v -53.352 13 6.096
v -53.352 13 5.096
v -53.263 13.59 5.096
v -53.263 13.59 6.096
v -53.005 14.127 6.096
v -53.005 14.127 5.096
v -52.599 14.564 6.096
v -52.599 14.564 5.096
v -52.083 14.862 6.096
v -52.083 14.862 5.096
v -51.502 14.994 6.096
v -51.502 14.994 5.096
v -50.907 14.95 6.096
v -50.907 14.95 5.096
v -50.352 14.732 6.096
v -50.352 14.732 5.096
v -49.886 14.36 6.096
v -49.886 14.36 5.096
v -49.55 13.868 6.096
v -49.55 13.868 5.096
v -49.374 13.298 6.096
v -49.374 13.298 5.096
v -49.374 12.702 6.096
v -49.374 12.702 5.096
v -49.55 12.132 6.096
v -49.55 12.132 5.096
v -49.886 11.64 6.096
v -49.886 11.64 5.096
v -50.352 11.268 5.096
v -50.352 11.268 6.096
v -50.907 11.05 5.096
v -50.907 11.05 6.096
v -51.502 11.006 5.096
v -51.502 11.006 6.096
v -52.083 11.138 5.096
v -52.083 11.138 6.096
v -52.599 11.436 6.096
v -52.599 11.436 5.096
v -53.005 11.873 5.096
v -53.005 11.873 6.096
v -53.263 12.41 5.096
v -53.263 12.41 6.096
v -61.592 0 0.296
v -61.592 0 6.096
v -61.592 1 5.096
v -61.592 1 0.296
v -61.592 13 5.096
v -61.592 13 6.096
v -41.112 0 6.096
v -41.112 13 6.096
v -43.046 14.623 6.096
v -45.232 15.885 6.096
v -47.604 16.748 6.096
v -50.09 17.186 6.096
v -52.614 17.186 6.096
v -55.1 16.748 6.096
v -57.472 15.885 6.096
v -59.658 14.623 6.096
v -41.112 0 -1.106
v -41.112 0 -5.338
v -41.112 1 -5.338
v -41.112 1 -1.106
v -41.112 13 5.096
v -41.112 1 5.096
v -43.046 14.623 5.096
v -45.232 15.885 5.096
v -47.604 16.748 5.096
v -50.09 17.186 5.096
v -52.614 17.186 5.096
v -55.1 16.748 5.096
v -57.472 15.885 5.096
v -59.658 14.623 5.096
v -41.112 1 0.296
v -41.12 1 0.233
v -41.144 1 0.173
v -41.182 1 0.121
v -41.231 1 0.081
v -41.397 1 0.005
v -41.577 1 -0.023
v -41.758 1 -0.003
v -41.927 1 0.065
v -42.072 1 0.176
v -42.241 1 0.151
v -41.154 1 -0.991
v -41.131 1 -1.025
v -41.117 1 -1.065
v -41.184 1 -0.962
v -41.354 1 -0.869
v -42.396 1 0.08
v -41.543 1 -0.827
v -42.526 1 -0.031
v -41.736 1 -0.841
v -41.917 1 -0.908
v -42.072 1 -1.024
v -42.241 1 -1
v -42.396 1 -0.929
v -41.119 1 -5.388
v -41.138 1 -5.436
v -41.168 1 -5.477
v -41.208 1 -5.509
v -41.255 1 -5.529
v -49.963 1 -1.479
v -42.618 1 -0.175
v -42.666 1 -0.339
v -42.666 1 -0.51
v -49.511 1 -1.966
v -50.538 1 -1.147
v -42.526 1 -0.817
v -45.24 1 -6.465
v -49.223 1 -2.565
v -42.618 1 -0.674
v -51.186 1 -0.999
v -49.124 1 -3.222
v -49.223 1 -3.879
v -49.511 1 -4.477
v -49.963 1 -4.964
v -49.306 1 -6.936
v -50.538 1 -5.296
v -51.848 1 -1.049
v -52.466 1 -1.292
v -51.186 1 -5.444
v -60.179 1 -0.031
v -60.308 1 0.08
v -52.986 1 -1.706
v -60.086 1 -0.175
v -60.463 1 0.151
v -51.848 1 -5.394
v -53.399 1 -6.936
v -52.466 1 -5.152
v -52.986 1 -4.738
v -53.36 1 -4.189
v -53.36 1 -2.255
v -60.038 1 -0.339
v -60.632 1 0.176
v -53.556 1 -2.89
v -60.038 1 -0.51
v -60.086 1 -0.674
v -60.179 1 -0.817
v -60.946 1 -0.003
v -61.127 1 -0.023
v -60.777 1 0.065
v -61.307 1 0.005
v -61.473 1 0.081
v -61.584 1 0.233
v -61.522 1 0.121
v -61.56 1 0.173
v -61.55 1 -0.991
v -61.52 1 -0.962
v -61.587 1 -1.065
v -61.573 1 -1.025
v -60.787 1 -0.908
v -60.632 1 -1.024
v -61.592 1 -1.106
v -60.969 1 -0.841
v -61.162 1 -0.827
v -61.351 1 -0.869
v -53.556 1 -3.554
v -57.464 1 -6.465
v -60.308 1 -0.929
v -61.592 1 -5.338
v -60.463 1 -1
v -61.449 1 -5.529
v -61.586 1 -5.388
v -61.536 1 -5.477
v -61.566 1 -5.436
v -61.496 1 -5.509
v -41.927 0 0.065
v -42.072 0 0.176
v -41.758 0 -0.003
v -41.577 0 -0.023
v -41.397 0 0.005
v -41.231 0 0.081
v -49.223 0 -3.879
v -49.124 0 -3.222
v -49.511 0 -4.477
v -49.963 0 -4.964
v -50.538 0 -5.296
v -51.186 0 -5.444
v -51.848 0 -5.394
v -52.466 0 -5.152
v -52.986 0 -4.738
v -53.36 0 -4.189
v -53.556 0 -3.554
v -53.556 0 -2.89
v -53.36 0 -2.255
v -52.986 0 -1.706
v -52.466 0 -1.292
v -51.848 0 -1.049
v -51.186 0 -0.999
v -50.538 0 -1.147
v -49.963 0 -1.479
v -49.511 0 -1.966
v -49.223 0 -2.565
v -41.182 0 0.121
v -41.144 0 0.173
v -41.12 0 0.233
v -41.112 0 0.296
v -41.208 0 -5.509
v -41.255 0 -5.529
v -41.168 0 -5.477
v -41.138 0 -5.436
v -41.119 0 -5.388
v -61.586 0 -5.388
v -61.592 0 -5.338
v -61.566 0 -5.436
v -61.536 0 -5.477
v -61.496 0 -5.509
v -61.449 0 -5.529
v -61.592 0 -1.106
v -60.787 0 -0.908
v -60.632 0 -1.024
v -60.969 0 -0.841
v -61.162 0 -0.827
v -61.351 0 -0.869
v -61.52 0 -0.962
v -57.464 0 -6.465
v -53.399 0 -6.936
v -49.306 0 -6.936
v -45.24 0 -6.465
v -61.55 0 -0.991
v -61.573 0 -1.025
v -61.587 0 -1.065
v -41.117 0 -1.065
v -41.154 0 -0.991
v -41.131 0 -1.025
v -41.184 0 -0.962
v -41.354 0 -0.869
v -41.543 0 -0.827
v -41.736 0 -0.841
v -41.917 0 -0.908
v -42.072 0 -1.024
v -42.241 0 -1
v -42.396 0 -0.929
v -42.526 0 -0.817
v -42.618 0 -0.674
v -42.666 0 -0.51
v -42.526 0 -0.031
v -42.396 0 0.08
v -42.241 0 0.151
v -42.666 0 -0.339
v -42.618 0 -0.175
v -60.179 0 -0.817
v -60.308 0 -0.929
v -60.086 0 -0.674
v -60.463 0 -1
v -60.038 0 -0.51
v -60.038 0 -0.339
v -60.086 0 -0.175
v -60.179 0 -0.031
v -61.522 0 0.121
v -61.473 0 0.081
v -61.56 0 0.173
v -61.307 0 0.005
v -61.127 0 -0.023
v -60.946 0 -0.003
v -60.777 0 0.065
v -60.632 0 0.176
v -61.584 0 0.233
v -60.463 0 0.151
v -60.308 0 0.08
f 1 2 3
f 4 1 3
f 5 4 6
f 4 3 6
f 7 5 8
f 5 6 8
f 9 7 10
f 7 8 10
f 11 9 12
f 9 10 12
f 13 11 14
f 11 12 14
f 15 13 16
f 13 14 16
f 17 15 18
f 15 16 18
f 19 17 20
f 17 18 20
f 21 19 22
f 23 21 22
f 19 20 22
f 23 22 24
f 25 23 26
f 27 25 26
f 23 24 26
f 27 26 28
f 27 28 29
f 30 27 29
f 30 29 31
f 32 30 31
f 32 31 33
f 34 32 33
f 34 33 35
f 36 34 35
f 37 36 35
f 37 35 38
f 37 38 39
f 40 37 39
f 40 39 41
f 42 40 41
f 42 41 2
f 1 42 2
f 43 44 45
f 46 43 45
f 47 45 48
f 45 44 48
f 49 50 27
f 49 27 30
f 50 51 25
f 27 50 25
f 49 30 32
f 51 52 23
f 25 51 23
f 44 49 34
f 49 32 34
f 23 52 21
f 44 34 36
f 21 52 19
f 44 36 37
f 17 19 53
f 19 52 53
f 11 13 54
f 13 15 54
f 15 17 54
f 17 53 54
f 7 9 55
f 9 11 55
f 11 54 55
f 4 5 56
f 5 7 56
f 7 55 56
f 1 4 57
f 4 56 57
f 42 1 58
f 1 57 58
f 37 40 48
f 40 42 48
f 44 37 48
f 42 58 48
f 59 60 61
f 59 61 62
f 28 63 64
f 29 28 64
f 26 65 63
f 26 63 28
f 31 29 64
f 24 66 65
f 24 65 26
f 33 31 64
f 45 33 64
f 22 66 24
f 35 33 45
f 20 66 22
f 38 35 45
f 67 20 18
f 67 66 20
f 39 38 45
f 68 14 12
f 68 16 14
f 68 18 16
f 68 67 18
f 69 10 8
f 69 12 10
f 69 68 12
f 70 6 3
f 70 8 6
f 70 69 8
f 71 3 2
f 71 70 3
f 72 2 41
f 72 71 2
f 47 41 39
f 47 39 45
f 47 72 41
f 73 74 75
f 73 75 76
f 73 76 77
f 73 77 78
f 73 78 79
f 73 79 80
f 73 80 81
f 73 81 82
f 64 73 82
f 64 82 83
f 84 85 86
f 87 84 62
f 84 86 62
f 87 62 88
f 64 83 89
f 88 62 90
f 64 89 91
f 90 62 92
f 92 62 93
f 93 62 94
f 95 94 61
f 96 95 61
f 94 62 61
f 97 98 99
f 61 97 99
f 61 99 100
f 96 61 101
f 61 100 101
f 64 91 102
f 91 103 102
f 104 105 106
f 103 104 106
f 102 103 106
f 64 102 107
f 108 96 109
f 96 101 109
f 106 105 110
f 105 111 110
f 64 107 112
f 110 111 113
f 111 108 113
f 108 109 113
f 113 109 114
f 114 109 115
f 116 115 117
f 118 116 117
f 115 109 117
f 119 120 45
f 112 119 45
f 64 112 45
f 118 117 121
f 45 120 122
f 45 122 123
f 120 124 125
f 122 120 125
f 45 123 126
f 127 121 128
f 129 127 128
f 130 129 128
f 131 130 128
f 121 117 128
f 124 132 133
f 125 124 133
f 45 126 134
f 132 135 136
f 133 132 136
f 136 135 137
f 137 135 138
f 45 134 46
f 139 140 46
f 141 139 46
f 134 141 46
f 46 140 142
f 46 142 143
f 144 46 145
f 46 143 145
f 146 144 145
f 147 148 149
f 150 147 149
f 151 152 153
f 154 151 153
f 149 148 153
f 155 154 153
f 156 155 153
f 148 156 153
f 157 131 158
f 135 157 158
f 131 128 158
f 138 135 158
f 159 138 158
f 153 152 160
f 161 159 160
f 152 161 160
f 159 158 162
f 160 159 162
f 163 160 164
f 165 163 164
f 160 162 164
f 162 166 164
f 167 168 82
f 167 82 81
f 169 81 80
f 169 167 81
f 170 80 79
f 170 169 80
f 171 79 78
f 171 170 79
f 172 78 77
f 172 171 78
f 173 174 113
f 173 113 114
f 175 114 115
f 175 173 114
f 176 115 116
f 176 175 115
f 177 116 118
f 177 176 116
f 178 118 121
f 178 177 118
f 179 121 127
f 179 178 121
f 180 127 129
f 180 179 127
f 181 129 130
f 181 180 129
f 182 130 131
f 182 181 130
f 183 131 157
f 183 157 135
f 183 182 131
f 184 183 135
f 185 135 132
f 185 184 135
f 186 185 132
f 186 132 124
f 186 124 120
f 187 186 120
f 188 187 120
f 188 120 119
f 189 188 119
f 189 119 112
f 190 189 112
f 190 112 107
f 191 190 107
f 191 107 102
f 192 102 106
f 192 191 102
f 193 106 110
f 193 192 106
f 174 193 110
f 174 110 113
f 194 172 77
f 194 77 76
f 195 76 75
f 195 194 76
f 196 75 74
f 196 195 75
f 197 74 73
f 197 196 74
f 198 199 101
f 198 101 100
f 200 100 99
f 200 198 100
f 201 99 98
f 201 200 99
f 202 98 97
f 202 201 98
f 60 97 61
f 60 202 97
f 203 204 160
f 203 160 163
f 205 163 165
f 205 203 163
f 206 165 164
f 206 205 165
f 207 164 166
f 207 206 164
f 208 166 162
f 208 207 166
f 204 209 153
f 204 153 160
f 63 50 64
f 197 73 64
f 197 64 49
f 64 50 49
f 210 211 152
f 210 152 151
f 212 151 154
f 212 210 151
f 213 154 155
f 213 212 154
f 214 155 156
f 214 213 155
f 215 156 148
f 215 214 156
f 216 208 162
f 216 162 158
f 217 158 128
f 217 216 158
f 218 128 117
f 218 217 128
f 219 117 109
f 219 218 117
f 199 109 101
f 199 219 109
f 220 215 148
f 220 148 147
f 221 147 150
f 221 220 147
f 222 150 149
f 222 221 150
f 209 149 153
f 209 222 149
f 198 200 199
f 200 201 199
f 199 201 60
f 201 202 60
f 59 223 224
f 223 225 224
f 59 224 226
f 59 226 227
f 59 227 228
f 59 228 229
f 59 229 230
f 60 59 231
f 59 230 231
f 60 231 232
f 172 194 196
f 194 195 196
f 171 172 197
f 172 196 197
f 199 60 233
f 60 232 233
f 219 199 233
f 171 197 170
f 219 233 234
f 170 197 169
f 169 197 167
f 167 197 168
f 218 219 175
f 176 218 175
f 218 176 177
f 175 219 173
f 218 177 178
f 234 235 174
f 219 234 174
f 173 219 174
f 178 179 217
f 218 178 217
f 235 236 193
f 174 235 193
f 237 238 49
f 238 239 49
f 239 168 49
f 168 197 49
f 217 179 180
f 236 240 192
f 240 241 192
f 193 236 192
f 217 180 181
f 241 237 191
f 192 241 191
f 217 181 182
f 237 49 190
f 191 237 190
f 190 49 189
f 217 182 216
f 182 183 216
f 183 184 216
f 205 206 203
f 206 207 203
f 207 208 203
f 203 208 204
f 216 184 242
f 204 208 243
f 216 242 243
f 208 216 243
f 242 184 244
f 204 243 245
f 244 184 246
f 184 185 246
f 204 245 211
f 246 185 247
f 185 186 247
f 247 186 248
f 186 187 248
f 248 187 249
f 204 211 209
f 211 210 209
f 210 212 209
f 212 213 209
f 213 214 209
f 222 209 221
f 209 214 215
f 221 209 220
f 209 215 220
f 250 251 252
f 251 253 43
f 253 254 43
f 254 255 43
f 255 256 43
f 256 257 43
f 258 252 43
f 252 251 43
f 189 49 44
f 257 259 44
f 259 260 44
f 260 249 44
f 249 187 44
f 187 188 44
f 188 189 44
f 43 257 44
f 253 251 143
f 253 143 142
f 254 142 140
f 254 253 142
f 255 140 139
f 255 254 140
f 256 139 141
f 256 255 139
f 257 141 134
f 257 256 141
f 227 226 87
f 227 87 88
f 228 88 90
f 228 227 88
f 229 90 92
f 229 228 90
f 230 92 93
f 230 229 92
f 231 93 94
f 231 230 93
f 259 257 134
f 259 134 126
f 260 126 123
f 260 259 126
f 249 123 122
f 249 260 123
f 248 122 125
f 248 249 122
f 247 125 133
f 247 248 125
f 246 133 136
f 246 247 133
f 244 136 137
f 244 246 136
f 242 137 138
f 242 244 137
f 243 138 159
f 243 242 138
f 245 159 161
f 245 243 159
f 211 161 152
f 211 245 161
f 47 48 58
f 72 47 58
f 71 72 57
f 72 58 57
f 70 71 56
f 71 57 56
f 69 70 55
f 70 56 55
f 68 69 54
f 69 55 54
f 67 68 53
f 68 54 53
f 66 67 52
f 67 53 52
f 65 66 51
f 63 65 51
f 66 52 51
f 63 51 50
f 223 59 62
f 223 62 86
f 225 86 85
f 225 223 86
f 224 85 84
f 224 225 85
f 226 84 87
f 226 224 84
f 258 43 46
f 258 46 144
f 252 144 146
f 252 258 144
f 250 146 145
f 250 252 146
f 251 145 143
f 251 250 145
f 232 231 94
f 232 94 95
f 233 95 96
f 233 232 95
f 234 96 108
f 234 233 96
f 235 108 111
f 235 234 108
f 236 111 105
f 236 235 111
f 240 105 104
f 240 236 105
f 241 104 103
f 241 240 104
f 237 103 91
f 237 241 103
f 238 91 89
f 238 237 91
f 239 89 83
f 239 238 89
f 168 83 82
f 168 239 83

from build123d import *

# Parameters (mm, degrees)
CROQUIS1_R              = 2.228578899
SALIENTE_EXTRUIR1_DEPTH = 1
SALIENTE_EXTRUIR2_DEPTH = 1
CROQUIS4_R              = 2
CORTAR_EXTRUIR1_DEPTH   = 7


with BuildPart() as part:
    # Croquis1 → Saliente-Extruir1 (new body)
    with BuildSketch(Plane(origin=(0, 0, 0), x_dir=(1, 0, 0), z_dir=(0, 1, 0))):
        with BuildLine():
            Line((-41.112087634, 5.337620698), (-41.112087634, 1.105825587))
            ThreePointArc((-41.112087634, 1.105825587), (-41.131019498, 1.025469781), (-41.183832696, 0.962017144))
            ThreePointArc((-41.183832696, 0.962017144), (-41.639608895, 0.827195653), (-42.072087634, 1.024352746))
            ThreePointArc((-42.072087634, 1.024352746), (-42.672087634, 0.424352746), (-42.072087634, -0.175647254))
            ThreePointArc((-42.072087634, -0.175647254), (-41.6683089, 0.018882448), (-41.231302611, -0.080639282))
            ThreePointArc((-41.231302611, -0.080639282), (-41.143877149, -0.173022759), (-41.112087634, -0.296178535))
            Line((-41.112087634, -0.296178535), (-41.112087634, -5.84119357))
            ThreePointArc((-41.112087634, -5.84119357), (-41.186615392, -6.021119495), (-41.366541317, -6.095647254))
            Line((-41.366541317, -6.095647254), (-61.33763395, -6.095647254))
            ThreePointArc((-61.33763395, -6.095647254), (-61.517559875, -6.021119495), (-61.592087634, -5.84119357))
            Line((-61.592087634, -5.84119357), (-61.592087634, -0.296178535))
            ThreePointArc((-61.592087634, -0.296178535), (-61.560298119, -0.173022759), (-61.472872656, -0.080639282))
            ThreePointArc((-61.472872656, -0.080639282), (-61.035866368, 0.018882448), (-60.632087634, -0.175647254))
            ThreePointArc((-60.632087634, -0.175647254), (-60.032087634, 0.424352746), (-60.632087634, 1.024352746))
            ThreePointArc((-60.632087634, 1.024352746), (-61.064566372, 0.827195653), (-61.520342572, 0.962017144))
            ThreePointArc((-61.520342572, 0.962017144), (-61.57315577, 1.025469781), (-61.592087634, 1.105825587))
            Line((-61.592087634, 1.105825587), (-61.592087634, 5.337620698))
            ThreePointArc((-61.592087634, 5.337620698), (-61.552355908, 5.457262162), (-61.448946833, 5.529368009))
            ThreePointArc((-61.448946833, 5.529368009), (-51.352087634, 6.994851774), (-41.255228435, 5.529368009))
            ThreePointArc((-41.255228435, 5.529368009), (-41.151819359, 5.457262162), (-41.112087634, 5.337620698))
        make_face()
        with Locations((-51.352087634, 3.221723142)):
            Circle(CROQUIS1_R, mode=Mode.SUBTRACT)
    extrude(amount=SALIENTE_EXTRUIR1_DEPTH)

    # Croquis3 → Saliente-Extruir2 (add)
    with BuildSketch(Plane.XY.offset(6.095647254)):
        with BuildLine():
            Line((-61.592087634, 0), (-61.592087634, 13))
            ThreePointArc((-61.592087634, 13), (-51.352087634, 17.241546879), (-41.112087634, 13))
            Line((-41.112087634, 13), (-41.112087634, 0))
            Line((-41.112087634, 0), (-61.592087634, 0))
        make_face()
    extrude(amount=-SALIENTE_EXTRUIR2_DEPTH)

    # Croquis4 → Cortar-Extruir1 (cut)
    with BuildSketch(Plane(origin=(0, 0, 5.095647254), x_dir=(-1, 0, 0), z_dir=(0, 0, -1))):
        with Locations((51.352087634, 13)):
            Circle(CROQUIS4_R)
    extrude(amount=-CORTAR_EXTRUIR1_DEPTH, mode=Mode.SUBTRACT)


solid = part.part
